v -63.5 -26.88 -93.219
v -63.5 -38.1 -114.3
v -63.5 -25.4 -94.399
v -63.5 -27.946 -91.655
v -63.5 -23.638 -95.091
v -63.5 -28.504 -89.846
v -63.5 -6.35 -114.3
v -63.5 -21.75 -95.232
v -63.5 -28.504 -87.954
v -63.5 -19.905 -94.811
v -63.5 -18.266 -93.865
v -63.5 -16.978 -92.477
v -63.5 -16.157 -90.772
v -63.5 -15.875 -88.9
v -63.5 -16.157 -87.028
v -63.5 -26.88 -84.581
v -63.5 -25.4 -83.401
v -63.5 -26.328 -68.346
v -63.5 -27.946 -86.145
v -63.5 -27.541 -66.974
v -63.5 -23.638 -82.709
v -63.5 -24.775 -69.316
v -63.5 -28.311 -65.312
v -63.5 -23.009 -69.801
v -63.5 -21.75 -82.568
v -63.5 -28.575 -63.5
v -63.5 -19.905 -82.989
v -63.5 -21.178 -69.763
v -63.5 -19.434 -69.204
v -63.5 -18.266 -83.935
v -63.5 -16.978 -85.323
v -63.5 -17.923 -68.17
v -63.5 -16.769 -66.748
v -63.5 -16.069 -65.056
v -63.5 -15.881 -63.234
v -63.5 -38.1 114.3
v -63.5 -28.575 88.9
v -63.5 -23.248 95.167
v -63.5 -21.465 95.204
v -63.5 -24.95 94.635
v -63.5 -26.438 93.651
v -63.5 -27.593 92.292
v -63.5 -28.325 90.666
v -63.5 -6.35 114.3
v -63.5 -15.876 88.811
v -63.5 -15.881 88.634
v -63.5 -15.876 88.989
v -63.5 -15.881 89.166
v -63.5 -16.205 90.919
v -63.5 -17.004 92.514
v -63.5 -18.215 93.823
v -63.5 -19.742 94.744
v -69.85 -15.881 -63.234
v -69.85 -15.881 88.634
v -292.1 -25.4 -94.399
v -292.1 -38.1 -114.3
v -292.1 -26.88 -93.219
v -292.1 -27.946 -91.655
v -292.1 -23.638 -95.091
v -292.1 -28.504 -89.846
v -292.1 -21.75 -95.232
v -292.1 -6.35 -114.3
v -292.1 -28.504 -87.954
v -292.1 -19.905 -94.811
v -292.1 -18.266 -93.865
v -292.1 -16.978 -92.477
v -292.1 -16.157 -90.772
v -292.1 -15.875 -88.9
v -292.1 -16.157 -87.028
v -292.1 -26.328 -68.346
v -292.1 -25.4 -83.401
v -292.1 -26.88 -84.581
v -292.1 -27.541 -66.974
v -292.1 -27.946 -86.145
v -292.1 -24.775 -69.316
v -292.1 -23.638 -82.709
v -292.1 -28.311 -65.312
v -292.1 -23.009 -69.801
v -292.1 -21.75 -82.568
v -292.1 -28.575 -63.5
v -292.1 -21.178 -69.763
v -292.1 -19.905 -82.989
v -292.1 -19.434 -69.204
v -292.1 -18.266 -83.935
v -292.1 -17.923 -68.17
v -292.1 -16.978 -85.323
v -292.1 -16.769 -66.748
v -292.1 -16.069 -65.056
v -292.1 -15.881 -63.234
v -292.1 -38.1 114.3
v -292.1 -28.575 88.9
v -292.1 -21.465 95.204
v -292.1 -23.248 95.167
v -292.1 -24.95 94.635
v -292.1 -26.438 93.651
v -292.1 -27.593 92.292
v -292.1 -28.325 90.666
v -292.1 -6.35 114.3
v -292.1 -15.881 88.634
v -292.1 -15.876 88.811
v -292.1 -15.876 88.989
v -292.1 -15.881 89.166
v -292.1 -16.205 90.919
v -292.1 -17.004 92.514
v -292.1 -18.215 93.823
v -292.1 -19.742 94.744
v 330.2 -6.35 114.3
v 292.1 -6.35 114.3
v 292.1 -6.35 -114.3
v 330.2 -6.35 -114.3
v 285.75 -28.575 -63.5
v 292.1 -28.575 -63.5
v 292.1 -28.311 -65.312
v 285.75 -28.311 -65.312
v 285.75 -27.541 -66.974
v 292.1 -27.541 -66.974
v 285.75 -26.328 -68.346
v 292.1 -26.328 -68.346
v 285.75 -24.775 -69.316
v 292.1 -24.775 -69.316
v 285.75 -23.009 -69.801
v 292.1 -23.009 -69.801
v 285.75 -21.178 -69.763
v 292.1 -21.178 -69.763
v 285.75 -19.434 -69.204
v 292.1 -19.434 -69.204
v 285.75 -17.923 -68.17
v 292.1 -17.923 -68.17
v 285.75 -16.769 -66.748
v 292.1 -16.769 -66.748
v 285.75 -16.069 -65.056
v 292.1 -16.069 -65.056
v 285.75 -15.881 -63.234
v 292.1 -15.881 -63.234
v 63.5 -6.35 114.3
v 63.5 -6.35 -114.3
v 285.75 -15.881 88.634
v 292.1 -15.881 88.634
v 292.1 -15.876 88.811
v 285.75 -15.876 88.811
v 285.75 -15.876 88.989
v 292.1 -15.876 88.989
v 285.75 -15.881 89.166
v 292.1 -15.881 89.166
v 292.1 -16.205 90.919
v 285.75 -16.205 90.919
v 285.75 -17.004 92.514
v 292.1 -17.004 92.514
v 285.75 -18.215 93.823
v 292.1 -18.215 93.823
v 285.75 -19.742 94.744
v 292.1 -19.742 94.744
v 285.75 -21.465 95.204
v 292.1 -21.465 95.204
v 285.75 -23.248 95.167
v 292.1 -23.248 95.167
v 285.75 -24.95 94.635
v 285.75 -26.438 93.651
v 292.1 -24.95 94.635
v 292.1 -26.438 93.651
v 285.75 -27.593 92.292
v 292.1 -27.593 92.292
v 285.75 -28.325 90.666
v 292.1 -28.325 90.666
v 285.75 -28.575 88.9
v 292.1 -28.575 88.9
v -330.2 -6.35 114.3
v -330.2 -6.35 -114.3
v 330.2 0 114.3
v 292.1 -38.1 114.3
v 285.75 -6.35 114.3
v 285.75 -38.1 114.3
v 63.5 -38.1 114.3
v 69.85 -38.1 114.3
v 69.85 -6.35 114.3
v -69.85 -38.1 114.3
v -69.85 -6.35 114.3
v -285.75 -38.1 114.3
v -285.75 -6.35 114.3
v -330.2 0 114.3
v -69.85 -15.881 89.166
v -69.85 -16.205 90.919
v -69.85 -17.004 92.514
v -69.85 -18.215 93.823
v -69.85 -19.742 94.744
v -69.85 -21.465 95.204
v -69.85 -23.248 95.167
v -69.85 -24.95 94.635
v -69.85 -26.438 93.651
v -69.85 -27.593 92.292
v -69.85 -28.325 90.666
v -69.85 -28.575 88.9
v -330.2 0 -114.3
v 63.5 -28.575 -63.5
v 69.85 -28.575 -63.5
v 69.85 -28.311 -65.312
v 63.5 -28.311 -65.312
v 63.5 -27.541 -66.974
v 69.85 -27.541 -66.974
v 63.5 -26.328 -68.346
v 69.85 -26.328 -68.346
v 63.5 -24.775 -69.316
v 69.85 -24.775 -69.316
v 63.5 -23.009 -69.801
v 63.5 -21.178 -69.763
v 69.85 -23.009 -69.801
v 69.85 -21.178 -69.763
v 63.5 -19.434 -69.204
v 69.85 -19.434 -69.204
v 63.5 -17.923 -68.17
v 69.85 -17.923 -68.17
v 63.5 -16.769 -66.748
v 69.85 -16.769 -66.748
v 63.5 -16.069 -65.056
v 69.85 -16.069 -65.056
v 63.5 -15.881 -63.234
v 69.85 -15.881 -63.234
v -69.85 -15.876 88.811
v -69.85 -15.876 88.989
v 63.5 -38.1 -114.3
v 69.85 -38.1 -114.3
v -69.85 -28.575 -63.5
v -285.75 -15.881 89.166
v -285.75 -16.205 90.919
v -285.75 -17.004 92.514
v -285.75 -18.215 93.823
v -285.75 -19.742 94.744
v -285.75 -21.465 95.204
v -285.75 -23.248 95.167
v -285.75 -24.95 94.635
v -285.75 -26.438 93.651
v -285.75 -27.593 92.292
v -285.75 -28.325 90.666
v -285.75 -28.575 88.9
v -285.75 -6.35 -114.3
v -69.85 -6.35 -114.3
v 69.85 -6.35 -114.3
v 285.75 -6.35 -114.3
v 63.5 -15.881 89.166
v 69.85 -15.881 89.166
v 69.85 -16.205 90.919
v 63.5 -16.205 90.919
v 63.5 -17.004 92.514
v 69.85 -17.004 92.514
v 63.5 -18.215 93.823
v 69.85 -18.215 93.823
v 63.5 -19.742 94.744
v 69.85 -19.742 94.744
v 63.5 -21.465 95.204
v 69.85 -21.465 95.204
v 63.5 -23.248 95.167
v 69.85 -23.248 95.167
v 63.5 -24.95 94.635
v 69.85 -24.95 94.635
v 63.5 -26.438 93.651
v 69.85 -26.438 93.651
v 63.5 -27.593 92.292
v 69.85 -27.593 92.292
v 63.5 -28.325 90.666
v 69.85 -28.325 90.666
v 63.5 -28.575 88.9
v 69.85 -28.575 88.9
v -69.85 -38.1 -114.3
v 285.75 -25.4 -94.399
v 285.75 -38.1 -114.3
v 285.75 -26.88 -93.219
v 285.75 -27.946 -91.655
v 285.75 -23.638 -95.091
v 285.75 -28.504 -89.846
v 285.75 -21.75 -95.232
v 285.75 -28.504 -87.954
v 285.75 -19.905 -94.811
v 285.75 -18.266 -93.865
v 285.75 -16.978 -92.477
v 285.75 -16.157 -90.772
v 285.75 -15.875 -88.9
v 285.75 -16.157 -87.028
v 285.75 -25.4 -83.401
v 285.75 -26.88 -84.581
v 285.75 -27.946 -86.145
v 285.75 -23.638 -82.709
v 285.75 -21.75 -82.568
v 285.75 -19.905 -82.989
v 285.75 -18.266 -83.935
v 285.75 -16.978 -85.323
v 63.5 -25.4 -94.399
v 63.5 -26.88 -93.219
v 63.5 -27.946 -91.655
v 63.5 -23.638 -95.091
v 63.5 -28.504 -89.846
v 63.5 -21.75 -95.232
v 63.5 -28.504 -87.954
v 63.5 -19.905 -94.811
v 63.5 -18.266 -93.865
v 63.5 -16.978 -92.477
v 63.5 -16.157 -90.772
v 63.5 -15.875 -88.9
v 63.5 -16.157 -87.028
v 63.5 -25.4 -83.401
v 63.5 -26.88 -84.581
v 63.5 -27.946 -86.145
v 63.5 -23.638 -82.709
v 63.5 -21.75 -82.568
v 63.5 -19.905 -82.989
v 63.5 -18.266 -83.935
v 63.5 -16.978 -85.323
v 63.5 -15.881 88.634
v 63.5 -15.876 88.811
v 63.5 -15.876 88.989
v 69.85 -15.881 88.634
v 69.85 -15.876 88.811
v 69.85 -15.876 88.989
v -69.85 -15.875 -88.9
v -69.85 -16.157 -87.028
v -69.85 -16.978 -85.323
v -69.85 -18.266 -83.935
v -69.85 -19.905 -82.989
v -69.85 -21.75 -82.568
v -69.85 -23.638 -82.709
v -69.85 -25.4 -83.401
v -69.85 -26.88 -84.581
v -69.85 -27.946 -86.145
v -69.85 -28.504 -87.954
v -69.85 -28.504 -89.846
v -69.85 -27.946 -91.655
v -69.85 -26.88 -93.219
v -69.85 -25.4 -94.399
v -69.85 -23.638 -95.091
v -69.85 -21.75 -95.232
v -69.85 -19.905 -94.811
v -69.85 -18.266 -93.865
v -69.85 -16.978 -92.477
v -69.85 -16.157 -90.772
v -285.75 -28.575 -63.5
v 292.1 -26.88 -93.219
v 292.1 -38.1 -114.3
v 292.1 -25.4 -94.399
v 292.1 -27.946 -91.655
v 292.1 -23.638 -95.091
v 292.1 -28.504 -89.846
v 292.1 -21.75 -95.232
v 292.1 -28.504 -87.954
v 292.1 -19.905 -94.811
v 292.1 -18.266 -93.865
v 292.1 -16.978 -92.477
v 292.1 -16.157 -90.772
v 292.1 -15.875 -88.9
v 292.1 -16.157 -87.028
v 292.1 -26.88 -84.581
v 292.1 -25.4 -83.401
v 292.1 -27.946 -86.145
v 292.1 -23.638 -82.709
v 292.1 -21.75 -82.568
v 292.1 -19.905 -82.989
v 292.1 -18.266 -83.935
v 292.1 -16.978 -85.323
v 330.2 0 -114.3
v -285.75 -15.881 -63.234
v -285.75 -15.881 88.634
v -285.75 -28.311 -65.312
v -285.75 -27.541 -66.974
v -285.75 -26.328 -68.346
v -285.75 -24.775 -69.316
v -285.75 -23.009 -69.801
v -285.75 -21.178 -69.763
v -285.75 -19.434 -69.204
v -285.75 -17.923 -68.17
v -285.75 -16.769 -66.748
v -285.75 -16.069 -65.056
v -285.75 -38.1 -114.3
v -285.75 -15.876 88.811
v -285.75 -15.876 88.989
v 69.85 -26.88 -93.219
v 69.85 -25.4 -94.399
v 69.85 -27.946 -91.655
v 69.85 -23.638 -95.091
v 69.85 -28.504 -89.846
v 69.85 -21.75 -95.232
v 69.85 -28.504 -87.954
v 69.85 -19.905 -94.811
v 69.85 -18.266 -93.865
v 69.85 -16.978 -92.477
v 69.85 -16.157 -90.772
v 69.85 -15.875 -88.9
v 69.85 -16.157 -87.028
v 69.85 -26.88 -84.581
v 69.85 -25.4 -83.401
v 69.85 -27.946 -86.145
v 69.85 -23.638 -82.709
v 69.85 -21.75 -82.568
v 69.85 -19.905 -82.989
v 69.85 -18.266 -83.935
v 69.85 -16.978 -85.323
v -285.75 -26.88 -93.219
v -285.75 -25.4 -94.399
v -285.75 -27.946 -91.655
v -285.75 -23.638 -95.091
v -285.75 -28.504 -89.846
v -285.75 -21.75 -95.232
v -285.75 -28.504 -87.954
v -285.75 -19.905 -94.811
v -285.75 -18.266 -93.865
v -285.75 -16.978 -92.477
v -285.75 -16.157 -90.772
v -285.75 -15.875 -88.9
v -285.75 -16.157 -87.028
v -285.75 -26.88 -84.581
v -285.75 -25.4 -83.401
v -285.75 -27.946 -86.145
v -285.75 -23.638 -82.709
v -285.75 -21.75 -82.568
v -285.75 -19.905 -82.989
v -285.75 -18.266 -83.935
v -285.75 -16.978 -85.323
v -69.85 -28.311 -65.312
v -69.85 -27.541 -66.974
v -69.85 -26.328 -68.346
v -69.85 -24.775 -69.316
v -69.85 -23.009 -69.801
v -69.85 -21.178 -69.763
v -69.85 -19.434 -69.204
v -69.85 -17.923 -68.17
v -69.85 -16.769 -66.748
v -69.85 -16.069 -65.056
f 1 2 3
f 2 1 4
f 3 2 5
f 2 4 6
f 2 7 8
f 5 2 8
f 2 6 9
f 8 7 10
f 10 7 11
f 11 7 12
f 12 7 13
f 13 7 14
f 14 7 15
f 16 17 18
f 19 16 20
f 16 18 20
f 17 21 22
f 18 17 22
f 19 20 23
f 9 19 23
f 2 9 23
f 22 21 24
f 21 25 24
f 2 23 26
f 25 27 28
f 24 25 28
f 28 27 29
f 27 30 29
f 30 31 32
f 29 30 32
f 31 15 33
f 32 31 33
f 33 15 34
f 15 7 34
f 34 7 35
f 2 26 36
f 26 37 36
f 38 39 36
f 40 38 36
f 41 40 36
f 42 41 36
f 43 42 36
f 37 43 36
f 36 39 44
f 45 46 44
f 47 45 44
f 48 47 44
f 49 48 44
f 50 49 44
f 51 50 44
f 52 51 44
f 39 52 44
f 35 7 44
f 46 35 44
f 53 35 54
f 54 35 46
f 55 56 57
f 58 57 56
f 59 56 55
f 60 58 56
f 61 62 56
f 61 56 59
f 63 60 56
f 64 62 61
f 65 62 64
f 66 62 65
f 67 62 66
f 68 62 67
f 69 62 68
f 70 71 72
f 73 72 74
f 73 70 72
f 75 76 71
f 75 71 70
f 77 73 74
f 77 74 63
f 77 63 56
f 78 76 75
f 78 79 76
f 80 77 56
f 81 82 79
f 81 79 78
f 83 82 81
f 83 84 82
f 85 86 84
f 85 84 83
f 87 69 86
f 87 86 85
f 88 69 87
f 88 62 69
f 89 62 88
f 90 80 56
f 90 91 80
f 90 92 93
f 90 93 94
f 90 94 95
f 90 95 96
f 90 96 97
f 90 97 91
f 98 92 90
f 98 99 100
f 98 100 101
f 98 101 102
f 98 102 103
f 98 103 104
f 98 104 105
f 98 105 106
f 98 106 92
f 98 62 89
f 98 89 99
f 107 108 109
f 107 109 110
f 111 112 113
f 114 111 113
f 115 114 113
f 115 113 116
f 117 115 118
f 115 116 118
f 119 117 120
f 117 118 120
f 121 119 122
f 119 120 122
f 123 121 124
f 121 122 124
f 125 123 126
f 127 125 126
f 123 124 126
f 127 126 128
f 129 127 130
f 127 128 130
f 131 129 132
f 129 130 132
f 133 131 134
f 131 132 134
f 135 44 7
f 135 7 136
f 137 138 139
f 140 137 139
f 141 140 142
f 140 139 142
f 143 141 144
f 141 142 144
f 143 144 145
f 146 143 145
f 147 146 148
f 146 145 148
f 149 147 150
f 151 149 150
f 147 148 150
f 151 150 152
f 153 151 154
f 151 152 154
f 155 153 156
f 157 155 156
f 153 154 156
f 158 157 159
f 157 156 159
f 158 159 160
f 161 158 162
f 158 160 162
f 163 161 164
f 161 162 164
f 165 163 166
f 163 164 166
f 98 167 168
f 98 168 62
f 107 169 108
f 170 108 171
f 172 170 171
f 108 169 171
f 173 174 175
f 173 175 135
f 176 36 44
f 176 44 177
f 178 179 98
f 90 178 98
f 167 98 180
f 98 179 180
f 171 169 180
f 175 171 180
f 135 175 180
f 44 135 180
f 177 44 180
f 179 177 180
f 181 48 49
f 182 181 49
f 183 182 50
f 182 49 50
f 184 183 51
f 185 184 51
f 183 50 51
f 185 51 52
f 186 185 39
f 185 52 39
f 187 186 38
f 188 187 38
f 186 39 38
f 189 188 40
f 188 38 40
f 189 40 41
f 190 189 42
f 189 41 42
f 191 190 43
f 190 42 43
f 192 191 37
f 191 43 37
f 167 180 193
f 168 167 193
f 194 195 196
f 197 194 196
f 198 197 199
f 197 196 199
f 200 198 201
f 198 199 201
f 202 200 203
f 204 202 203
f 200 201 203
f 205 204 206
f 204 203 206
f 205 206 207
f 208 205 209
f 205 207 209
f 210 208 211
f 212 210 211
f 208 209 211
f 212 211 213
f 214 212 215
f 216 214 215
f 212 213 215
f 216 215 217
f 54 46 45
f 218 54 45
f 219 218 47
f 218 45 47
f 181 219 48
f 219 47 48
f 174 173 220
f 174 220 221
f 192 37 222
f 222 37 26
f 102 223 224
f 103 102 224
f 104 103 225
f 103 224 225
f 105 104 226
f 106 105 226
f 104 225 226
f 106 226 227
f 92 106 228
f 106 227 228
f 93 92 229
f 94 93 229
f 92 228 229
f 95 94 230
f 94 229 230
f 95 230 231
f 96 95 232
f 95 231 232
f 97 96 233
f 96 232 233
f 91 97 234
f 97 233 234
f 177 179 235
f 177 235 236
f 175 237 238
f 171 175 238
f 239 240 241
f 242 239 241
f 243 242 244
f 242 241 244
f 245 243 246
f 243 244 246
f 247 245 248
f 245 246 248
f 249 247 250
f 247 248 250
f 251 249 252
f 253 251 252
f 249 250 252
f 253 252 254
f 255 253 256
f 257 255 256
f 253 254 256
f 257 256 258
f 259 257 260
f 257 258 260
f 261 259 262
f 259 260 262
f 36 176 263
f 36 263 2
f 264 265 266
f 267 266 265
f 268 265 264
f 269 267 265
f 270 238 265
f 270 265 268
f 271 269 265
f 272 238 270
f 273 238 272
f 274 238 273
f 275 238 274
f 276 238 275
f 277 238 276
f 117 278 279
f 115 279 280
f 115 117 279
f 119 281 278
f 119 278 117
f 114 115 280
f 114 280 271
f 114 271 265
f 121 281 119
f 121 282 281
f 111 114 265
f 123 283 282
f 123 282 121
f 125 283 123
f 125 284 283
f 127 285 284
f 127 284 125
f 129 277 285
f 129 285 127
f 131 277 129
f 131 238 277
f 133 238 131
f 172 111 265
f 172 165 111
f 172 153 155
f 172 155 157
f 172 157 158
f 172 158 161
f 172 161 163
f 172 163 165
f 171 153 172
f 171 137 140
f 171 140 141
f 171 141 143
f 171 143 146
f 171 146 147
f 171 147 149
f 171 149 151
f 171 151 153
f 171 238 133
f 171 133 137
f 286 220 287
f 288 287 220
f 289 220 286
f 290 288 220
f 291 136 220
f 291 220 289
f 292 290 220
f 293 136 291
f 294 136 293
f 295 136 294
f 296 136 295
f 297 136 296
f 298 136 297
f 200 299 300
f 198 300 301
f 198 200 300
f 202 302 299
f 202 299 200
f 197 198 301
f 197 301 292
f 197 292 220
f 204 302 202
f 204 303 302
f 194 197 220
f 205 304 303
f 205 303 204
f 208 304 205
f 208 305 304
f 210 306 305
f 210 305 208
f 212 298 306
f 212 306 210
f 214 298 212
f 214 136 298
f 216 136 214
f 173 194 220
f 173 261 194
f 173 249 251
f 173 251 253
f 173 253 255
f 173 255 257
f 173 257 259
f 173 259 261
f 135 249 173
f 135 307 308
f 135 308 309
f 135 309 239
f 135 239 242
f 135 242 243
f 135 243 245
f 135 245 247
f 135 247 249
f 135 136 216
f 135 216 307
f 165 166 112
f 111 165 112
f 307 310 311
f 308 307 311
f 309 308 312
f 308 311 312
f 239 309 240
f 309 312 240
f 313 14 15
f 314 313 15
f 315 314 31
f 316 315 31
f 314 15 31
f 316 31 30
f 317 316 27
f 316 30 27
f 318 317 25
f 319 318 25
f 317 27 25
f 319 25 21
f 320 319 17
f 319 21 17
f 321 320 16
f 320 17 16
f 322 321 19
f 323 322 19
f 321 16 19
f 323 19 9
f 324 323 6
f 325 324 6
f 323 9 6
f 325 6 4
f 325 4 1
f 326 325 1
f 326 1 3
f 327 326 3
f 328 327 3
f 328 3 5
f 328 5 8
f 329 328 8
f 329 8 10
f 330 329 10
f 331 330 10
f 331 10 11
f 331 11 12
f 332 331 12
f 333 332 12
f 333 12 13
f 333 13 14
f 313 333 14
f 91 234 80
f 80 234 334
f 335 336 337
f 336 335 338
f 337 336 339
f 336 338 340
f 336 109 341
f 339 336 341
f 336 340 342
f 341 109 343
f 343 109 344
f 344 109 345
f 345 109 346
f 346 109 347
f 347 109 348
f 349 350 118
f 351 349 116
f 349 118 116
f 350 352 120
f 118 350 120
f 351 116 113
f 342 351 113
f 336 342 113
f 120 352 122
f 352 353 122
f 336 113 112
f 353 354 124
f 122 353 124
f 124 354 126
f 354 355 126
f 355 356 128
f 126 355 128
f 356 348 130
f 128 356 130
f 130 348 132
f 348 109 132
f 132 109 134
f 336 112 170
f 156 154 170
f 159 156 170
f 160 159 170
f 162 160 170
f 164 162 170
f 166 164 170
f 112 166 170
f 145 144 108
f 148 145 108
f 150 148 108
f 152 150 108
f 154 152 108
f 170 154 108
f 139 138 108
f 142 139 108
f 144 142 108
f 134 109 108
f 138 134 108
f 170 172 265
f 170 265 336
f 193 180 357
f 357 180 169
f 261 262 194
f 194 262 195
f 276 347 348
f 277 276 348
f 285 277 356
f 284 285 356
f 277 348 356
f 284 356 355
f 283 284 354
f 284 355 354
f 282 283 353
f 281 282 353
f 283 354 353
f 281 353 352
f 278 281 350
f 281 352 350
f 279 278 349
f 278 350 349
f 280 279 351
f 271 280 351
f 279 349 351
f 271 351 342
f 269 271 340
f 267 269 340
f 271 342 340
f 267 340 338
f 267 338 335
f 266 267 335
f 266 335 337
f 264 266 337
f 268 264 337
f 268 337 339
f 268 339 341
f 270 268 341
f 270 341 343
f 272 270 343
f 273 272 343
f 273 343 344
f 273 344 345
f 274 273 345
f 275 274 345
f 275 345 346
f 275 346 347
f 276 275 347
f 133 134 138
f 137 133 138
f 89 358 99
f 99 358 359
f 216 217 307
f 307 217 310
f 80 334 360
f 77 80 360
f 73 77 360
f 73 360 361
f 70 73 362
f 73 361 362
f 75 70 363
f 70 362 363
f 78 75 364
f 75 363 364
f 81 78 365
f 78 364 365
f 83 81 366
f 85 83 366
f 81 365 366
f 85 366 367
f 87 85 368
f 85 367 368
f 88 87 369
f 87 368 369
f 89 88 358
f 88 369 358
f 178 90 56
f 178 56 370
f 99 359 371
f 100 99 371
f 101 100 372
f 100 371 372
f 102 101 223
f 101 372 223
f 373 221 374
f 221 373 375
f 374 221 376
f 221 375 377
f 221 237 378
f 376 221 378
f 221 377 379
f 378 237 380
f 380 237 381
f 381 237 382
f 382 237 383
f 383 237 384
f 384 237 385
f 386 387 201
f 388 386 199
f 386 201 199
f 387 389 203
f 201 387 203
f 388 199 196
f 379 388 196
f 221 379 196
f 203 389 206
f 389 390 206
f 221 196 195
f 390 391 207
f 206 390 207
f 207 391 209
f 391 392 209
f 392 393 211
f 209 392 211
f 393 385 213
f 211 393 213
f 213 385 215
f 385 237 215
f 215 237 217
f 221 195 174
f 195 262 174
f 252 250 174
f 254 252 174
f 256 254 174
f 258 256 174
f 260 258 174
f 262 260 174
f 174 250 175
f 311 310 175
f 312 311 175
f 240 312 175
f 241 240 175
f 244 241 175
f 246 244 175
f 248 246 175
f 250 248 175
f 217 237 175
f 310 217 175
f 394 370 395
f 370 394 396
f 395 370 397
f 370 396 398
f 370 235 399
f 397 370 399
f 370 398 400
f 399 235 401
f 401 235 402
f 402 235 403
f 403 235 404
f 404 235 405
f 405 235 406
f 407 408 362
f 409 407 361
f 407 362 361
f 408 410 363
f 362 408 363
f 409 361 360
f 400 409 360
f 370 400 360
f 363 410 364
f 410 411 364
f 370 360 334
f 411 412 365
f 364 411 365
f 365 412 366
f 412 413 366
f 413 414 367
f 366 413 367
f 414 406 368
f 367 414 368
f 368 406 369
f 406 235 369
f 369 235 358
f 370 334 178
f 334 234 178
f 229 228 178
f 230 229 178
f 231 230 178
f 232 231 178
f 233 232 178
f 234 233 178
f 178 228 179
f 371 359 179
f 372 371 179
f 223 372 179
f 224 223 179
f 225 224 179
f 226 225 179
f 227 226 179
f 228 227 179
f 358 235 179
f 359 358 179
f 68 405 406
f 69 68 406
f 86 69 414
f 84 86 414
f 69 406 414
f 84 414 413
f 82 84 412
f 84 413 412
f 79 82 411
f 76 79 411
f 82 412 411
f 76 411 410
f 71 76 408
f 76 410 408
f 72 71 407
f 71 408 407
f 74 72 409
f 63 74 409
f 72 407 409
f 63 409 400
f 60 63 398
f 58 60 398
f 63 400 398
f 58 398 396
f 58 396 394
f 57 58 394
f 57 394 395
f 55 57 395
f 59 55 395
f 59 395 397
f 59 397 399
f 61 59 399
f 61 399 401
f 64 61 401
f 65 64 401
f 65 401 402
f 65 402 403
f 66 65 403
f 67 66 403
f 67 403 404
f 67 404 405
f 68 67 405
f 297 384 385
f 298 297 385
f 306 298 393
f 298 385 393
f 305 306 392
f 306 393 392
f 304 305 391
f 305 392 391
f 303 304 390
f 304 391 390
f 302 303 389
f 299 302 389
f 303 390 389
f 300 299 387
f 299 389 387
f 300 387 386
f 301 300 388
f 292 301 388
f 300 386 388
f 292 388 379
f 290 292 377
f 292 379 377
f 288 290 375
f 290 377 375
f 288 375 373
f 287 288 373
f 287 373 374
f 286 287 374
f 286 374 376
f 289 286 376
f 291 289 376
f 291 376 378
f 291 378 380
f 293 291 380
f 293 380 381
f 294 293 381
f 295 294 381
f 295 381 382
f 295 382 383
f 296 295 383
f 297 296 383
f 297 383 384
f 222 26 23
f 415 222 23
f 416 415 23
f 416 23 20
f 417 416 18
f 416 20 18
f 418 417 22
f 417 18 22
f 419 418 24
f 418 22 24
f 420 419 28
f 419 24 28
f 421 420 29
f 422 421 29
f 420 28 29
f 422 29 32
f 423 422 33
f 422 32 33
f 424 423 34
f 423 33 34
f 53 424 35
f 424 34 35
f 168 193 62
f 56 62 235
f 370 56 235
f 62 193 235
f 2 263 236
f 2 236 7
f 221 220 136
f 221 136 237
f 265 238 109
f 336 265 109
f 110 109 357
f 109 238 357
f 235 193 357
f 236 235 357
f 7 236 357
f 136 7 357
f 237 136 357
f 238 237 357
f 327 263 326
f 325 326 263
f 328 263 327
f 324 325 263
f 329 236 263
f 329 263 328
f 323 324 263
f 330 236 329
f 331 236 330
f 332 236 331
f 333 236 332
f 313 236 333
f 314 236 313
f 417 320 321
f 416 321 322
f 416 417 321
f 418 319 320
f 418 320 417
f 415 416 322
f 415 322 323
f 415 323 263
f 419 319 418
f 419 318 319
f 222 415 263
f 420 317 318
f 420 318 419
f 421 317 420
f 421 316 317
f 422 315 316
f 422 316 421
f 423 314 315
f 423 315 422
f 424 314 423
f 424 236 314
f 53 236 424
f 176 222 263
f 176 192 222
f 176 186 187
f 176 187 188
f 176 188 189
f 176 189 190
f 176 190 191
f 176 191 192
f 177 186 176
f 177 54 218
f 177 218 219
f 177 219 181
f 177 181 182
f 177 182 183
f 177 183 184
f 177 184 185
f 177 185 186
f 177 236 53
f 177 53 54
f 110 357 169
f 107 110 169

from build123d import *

# Parameters (mm, degrees)
F1_DEPTH = 6.35
F2_W     = 6.35
F2_H     = 228.6
F3_DEPTH = 31.75
F4_R     = 6.35
F5_DEPTH = 762


with BuildPart() as f1:
    # F0 (on Front) → F1 (new body)
    with BuildSketch(Plane.XZ):
        Polygon((-292.1, 114.3), (-330.2, 114.3), (-330.2, -114.3), (-292.1, -114.3), (-285.75, -114.3), (285.75, -114.3), (292.1, -114.3), (330.2, -114.3), (330.2, 114.3), (292.1, 114.3), (285.75, 114.3), (-285.75, 114.3), align=None)
    extrude(amount=F1_DEPTH)

    # F2 (on face) → F3 (join)
    with BuildSketch(Plane.XZ.offset(6.35)):
        with Locations((-288.925, 0)):
            Rectangle(F2_W, F2_H)
        with Locations((288.925, 0)):
            Rectangle(F2_W, F2_H)
        with Locations((-66.675, 0)):
            Rectangle(F2_W, F2_H)
        with Locations((66.675, 0)):
            Rectangle(F2_W, F2_H)
    extrude(amount=F3_DEPTH)

    # F4 (on face) → F5 (cut)
    with BuildSketch(Plane.YZ.offset(292.1)):
        with Locations((-22.225, -88.9)):
            Circle(F4_R)
        with BuildLine():
            Line((-28.575, 88.9), (-28.575, -63.5))
            ThreePointArc((-28.575, -63.5), (-22.092195, -69.848611), (-15.880555, -63.234449))
            Line((-15.880555, -63.234449), (-15.880555, 88.634449))
            Line((-15.880555, 88.634449), (-15.880555, 89.165551))
            ThreePointArc((-15.880555, 89.165551), (-22.357805, 95.248611), (-28.575, 88.9))
        make_face()
        with BuildLine():
            Line((-15.880555, 89.165551), (-15.880555, 88.634449))
            ThreePointArc((-15.880555, 88.634449), (-15.875, 88.9), (-15.880555, 89.165551))
        make_face()
    extrude(amount=-F5_DEPTH, mode=Mode.SUBTRACT)


solid = f1.part
